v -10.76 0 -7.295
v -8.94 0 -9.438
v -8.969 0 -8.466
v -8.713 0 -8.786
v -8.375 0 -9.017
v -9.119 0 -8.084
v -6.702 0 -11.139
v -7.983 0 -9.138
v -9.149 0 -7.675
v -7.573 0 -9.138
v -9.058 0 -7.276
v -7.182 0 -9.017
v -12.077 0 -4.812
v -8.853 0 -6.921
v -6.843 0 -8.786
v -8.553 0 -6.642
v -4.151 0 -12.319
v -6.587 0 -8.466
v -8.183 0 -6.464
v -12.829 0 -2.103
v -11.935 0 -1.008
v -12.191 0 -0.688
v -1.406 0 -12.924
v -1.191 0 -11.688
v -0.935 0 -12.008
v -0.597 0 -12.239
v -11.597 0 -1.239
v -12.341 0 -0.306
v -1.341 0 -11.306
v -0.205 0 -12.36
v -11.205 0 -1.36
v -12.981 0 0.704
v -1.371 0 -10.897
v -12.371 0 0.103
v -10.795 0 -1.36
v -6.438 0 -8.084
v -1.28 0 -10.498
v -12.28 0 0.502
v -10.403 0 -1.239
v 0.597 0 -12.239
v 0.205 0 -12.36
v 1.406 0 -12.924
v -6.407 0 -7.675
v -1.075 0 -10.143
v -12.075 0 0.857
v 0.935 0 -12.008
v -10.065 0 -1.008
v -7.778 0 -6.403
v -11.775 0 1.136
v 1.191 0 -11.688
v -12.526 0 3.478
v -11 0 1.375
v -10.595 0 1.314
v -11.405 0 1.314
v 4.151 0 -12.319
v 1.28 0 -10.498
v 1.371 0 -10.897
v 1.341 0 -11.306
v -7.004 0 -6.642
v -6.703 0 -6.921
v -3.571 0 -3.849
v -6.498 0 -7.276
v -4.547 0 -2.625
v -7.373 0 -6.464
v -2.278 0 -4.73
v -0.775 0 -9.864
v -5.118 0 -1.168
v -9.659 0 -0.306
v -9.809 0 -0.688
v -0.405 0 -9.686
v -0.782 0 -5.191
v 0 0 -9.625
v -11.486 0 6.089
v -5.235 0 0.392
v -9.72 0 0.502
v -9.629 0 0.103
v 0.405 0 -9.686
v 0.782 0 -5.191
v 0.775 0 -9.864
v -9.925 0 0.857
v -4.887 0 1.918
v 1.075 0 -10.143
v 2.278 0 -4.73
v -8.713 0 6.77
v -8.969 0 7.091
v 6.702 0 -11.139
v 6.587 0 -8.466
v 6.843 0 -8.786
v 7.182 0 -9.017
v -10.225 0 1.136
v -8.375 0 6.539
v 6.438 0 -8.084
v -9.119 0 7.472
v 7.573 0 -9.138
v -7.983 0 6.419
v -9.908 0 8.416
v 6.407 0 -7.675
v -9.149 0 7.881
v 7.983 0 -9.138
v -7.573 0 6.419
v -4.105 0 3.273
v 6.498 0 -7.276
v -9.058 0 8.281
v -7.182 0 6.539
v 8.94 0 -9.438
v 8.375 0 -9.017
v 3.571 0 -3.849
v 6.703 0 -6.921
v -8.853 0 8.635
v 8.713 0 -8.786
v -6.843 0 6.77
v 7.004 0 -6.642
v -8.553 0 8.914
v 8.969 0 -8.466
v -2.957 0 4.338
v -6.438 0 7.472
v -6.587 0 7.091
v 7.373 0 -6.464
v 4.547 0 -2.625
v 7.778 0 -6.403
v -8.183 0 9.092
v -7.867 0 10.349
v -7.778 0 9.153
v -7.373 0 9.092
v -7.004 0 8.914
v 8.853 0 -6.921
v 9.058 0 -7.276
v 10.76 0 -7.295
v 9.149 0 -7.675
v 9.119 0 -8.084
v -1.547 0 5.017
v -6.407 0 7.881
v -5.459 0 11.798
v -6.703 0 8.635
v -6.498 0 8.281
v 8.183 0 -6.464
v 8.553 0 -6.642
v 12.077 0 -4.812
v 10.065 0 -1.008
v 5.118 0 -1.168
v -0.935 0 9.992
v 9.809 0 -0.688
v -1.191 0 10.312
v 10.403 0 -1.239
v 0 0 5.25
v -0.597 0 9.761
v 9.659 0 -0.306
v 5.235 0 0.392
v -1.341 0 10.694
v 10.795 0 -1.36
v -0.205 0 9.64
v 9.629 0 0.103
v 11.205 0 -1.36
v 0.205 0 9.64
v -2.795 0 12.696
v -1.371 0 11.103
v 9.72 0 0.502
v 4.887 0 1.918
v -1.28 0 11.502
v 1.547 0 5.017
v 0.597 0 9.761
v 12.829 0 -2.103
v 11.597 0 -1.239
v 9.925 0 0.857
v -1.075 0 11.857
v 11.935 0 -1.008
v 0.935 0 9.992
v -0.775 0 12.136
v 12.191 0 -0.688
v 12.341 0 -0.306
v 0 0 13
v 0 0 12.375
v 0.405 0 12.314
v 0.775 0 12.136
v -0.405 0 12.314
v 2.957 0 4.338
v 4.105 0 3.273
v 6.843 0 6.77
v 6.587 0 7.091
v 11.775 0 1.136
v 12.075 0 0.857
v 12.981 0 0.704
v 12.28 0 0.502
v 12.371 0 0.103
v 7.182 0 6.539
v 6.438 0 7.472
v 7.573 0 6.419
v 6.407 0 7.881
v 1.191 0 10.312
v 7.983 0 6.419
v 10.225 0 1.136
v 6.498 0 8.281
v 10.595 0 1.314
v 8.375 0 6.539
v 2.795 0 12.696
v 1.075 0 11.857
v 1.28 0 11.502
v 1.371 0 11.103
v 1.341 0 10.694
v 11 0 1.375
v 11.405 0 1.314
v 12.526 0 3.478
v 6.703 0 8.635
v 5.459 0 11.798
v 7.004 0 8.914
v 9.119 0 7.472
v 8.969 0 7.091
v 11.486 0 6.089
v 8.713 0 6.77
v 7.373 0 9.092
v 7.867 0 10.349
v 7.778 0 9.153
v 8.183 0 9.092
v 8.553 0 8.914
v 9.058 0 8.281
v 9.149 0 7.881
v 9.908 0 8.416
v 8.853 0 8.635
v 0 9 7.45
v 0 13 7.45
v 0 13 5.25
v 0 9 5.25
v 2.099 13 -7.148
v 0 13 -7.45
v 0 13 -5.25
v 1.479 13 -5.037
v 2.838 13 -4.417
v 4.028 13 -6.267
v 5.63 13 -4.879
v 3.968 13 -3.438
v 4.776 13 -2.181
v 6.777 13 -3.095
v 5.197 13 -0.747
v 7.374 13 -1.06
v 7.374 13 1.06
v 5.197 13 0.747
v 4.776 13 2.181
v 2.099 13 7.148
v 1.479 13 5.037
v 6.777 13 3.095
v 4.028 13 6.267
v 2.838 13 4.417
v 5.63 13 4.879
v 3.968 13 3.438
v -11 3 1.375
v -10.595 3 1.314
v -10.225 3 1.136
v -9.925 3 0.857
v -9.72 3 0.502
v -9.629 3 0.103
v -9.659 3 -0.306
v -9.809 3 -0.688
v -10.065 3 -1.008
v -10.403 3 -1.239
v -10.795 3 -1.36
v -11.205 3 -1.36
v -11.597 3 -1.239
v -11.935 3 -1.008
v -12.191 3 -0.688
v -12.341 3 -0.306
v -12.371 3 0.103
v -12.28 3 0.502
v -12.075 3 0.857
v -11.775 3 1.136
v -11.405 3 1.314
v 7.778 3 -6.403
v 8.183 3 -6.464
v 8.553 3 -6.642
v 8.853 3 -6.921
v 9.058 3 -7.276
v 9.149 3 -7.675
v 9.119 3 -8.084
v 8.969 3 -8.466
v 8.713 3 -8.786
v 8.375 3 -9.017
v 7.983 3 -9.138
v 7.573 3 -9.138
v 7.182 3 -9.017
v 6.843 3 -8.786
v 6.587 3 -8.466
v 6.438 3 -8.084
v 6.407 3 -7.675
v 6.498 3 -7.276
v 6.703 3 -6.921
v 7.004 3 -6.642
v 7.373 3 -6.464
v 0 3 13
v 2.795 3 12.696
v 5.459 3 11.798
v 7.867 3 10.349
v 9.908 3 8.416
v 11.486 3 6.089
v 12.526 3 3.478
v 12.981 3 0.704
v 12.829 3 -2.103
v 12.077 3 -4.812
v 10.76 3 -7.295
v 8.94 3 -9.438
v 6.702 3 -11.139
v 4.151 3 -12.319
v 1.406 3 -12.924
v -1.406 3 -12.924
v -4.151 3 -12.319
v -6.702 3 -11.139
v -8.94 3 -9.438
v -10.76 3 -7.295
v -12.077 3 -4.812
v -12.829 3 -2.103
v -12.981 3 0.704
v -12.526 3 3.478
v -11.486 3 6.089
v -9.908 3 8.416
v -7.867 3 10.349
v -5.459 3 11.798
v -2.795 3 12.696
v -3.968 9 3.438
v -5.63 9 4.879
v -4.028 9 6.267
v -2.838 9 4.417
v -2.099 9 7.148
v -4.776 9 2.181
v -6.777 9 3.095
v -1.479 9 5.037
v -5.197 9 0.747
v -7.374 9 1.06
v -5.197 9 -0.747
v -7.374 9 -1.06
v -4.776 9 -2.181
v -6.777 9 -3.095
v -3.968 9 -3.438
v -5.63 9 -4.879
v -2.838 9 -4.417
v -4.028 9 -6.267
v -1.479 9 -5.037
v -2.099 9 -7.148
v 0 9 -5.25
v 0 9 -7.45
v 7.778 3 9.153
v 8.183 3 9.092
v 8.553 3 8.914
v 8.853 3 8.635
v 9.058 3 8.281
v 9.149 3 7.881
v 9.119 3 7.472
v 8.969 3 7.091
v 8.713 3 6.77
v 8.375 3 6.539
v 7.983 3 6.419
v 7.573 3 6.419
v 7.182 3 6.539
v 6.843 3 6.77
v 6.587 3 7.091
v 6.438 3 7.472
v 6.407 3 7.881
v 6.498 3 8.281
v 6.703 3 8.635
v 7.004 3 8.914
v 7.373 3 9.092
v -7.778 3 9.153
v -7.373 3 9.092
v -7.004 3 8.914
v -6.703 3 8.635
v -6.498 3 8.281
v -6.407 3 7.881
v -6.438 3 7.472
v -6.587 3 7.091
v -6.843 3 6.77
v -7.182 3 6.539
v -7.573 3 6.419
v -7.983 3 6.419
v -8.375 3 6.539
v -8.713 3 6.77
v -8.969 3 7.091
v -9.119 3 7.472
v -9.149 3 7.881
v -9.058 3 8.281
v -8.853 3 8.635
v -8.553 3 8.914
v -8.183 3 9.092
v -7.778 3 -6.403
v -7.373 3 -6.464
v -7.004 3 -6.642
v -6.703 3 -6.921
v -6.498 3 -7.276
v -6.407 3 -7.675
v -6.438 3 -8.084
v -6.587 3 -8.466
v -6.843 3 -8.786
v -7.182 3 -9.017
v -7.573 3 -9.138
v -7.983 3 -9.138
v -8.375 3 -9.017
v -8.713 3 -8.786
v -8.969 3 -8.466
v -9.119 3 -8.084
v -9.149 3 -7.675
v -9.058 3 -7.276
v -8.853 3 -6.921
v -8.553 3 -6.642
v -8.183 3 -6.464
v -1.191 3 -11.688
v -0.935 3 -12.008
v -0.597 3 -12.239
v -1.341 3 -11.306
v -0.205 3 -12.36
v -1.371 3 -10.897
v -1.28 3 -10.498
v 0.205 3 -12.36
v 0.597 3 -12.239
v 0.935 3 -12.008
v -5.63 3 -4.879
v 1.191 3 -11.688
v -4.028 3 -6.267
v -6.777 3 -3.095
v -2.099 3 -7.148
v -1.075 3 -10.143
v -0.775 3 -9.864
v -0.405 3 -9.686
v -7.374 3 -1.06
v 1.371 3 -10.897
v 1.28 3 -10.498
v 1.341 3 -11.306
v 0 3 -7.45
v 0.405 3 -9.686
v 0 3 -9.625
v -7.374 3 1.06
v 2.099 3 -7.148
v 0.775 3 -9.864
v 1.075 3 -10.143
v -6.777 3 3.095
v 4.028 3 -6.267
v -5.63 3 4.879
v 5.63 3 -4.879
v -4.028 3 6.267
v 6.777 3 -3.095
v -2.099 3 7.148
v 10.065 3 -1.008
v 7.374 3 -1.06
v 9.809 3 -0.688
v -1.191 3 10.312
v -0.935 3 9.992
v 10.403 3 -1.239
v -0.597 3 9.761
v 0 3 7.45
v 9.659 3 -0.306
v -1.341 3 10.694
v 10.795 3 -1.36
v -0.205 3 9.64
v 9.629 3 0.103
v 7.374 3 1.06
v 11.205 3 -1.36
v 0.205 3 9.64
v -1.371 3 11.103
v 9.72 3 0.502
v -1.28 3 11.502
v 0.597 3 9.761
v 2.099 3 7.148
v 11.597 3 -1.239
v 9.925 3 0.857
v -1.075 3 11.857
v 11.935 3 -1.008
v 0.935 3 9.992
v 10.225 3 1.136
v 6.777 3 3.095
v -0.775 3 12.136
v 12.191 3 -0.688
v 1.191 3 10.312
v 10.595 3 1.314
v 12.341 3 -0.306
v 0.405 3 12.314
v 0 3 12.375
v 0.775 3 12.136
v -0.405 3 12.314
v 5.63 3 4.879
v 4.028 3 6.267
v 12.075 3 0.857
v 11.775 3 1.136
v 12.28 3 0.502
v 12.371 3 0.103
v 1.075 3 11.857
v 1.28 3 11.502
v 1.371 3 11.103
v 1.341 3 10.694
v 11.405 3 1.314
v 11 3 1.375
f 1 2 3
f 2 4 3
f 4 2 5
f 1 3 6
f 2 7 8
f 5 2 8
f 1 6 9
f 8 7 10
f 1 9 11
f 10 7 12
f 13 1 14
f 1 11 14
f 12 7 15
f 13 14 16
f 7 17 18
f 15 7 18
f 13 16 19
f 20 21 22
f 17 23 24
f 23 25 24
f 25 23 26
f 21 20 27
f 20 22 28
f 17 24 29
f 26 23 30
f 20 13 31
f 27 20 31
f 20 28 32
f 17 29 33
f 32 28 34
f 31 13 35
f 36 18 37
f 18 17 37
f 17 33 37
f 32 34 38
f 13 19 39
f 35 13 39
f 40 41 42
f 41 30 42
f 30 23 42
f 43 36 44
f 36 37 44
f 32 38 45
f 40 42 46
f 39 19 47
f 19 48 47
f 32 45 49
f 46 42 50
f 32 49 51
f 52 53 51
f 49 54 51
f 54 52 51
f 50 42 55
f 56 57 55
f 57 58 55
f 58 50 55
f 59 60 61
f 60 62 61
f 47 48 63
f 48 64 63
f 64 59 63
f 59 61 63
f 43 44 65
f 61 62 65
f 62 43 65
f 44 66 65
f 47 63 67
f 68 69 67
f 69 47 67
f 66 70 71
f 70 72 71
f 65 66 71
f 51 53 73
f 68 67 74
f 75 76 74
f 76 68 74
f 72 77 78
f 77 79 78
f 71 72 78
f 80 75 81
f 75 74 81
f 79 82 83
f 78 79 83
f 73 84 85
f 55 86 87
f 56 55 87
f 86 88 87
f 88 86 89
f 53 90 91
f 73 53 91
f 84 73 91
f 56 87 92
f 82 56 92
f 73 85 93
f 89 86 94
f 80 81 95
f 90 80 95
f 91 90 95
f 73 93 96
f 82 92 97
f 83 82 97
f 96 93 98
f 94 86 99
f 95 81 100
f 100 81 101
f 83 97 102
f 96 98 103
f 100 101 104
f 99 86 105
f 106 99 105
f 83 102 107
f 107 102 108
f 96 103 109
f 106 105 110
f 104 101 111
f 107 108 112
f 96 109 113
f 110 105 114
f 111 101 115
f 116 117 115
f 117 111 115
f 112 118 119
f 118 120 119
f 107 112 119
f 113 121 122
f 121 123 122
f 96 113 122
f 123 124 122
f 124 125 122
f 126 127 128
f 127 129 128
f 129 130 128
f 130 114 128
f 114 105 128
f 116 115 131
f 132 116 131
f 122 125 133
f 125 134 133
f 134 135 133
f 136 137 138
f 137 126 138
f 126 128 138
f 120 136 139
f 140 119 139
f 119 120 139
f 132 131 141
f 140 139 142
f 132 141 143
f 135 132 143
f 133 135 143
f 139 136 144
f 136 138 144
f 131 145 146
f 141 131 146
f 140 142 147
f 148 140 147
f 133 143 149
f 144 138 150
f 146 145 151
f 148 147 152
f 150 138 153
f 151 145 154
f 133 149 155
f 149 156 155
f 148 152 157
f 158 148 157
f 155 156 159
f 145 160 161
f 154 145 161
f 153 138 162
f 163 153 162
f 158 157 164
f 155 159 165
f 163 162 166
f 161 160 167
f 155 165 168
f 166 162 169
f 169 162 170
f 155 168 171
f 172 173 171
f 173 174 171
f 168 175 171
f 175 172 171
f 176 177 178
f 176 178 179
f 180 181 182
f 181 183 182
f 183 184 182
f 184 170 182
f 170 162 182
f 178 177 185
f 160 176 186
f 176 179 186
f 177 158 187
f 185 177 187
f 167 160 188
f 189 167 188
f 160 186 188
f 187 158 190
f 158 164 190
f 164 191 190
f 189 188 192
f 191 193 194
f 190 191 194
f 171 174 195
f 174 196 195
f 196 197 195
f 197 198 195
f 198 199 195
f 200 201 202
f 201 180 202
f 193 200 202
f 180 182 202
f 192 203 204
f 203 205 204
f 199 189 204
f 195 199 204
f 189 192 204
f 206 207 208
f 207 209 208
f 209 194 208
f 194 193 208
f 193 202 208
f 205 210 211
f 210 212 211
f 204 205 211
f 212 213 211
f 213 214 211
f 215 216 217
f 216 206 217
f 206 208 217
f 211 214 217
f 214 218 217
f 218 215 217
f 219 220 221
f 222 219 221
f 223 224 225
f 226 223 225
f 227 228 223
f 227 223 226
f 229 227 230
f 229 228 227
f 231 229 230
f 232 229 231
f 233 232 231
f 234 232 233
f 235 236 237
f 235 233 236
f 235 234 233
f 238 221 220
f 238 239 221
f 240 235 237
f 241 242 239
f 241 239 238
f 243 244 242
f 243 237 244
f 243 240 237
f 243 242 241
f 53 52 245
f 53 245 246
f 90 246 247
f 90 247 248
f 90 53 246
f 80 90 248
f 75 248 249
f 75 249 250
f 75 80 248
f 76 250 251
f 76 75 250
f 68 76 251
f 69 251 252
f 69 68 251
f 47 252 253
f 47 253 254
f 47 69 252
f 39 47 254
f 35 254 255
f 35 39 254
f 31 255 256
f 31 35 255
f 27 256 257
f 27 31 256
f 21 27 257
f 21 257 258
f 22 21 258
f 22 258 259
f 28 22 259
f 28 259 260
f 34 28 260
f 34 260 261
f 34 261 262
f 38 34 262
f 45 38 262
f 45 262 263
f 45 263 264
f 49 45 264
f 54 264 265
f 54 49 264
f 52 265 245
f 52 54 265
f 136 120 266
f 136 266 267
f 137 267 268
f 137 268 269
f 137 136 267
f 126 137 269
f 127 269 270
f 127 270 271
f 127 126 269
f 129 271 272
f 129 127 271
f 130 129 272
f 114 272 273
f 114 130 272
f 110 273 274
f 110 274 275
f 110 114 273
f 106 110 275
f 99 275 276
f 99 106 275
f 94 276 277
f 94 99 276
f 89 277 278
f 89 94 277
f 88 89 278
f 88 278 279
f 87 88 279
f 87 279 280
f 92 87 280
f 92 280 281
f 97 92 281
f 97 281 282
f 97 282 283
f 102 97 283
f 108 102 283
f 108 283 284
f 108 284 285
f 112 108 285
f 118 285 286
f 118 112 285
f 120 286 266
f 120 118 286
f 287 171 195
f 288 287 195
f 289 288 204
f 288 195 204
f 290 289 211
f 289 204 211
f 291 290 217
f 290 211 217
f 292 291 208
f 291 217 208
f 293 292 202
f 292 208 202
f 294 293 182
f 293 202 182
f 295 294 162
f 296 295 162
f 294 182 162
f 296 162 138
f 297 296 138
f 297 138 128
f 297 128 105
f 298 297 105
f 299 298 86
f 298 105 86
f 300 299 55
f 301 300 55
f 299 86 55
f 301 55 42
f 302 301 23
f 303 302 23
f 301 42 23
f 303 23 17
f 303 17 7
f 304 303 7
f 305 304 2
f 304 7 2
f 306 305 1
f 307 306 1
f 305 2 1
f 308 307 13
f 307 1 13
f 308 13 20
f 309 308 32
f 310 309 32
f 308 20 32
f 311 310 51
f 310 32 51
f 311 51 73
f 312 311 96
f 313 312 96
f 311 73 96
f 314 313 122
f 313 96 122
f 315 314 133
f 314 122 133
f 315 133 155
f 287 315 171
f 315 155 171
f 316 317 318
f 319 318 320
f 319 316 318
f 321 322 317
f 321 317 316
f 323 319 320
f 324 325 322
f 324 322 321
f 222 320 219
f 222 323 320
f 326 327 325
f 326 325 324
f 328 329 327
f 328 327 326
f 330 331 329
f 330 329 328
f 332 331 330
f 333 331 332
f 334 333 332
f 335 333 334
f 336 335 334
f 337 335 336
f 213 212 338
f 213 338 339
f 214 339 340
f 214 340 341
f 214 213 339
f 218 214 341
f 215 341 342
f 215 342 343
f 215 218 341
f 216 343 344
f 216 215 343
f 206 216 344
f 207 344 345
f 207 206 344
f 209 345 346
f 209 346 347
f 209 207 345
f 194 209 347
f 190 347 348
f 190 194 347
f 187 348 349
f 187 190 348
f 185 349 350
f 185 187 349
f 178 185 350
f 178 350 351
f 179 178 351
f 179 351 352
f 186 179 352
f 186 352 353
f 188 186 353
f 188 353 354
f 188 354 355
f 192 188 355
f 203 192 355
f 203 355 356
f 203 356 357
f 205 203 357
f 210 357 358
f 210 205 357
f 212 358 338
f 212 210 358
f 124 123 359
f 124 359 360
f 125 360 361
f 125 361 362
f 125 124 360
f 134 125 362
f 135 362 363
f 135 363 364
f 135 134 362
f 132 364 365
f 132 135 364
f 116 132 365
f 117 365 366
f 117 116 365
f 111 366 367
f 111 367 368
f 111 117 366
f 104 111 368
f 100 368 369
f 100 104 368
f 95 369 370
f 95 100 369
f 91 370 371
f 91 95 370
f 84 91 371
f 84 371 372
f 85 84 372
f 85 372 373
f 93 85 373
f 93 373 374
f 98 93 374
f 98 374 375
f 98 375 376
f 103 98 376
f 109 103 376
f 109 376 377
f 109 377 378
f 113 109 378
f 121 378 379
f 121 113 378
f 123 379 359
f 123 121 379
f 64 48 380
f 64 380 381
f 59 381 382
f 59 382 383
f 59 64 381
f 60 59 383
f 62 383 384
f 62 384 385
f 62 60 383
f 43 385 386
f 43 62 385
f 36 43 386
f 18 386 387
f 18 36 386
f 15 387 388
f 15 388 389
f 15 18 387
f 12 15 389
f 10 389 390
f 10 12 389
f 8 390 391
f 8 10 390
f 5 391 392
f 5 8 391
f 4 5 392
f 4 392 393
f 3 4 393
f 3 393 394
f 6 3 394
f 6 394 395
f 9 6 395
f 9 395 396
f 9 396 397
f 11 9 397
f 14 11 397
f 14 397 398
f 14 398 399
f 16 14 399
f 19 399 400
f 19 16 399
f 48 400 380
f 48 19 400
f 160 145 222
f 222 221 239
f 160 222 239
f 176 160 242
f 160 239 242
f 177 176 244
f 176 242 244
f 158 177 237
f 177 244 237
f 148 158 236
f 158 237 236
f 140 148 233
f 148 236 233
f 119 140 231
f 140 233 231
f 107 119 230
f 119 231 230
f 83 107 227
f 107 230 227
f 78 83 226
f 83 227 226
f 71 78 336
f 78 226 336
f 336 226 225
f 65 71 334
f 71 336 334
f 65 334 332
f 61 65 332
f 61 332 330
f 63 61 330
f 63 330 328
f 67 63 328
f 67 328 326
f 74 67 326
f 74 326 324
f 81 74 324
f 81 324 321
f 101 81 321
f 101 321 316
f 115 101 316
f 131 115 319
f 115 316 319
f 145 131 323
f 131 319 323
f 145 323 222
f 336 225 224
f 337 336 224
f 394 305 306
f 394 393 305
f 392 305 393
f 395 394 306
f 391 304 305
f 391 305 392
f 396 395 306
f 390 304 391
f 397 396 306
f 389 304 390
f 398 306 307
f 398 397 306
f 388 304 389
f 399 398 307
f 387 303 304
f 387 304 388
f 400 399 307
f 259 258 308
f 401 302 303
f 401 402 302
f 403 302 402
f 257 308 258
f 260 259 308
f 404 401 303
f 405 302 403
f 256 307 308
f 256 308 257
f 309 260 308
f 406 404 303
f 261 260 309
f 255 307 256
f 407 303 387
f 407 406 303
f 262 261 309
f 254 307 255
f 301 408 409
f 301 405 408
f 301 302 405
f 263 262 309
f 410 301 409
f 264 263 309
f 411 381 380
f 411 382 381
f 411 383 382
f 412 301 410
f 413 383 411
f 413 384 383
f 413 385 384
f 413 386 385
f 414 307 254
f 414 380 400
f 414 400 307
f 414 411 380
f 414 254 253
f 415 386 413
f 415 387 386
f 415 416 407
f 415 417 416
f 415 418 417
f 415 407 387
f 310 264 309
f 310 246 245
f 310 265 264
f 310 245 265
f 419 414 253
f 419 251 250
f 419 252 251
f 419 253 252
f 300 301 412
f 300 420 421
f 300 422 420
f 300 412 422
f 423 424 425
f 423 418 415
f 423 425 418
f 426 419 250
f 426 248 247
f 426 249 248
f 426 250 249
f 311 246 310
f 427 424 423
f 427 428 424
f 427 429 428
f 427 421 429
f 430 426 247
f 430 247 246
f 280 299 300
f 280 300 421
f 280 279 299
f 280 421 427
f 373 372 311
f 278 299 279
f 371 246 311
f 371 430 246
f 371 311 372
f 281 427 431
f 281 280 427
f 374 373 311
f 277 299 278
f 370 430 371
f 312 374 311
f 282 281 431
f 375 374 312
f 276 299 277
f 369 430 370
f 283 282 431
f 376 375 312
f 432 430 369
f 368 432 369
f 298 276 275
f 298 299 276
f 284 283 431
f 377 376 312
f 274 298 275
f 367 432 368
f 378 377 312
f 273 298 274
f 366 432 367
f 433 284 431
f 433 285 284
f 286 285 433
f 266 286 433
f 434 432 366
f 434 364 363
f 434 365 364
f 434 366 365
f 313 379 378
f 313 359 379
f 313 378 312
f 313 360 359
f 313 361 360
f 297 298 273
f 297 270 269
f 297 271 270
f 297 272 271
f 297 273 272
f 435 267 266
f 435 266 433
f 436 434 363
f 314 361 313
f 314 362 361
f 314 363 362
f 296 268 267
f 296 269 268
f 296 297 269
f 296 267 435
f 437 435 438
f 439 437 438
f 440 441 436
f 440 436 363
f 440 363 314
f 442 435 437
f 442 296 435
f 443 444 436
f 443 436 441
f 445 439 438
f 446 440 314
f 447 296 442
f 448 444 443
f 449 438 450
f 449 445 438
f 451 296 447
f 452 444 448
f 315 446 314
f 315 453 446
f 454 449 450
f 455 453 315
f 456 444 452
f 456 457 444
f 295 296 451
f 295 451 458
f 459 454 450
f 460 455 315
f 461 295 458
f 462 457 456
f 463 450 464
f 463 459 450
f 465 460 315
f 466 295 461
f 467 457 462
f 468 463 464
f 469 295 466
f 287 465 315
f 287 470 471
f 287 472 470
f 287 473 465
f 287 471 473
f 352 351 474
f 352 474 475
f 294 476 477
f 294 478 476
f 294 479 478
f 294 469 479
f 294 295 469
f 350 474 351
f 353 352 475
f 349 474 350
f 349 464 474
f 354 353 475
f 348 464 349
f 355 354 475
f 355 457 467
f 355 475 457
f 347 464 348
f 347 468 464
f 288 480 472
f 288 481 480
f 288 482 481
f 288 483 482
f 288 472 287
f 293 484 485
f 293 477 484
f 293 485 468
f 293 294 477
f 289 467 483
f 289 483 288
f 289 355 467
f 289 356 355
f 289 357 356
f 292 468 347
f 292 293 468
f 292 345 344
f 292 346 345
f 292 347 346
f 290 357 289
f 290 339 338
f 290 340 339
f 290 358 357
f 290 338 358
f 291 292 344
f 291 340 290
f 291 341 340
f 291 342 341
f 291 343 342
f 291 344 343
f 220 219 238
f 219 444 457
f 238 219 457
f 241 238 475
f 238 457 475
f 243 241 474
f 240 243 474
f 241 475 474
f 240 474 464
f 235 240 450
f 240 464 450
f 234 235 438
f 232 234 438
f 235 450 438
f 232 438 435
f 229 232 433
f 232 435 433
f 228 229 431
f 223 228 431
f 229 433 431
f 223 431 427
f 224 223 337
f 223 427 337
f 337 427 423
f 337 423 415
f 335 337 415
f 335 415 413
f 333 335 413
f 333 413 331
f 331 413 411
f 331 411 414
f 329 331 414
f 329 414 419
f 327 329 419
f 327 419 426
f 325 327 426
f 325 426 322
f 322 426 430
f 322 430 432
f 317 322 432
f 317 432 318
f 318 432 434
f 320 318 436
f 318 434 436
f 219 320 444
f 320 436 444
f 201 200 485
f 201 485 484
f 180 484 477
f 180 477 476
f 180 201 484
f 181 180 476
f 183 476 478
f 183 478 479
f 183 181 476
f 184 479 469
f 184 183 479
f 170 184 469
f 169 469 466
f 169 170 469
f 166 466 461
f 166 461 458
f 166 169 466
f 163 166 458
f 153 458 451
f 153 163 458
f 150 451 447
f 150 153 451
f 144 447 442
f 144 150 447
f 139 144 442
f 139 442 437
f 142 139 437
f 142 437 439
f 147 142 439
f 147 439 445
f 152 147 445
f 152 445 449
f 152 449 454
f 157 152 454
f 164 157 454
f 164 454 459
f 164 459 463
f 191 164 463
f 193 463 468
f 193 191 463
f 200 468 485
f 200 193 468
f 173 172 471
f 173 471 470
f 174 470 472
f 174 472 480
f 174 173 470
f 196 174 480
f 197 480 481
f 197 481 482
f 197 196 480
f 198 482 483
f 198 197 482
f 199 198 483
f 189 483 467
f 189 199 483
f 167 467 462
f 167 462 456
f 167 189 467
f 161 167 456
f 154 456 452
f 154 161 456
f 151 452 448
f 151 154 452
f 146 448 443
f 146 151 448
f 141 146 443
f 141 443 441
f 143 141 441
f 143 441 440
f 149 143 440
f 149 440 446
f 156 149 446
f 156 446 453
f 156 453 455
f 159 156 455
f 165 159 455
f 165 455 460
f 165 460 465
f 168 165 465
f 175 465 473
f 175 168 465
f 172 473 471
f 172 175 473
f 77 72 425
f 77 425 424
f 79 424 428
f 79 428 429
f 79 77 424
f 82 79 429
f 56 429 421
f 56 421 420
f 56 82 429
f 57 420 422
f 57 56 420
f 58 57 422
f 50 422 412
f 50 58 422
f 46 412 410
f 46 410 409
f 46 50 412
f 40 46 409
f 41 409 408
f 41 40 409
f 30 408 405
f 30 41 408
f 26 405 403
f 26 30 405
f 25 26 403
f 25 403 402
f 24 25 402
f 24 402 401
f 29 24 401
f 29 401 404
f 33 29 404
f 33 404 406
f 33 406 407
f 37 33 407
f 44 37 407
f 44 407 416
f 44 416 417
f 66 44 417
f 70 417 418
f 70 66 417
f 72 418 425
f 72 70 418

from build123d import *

# Parameters (mm, degrees)
SKETCH1_R           = 13
SKETCH1_R_2         = 1.375
SKETCH1_R_3         = 5
BOSS_EXTRUDE1_DEPTH = 3
SKETCH2_R           = 7.5
SKETCH2_R_2         = 5
BOSS_EXTRUDE2_DEPTH = 10
SKETCH3_R           = 5.25
CUT_EXTRUDE1_DEPTH  = 18
CUT_EXTRUDE2_DEPTH  = 4
CUT_EXTRUDE3_START  = -10
SKETCH5_R           = 7.5
SKETCH5_R_2         = 7.45
CUT_EXTRUDE3_DEPTH  = 10


with BuildPart() as part:
    # Sketch1 → Boss-Extrude1 (new body)
    with BuildSketch(Plane(origin=(0, 0, 0), x_dir=(1, 0, 0), z_dir=(0, 1, 0))):
        with Locations(Location((0, 0, 0), (0, 0, 270))):
            Circle(SKETCH1_R)
        with Locations(Location((0, 11, 0), (0, 0, 270))):
            Circle(SKETCH1_R_2, mode=Mode.SUBTRACT)
        with Locations(Location((7.778174593, 7.778174593, 0), (0, 0, 270))):
            Circle(SKETCH1_R_2, mode=Mode.SUBTRACT)
        with Locations(Location((11, 0, 0), (0, 0, 270))):
            Circle(SKETCH1_R_2, mode=Mode.SUBTRACT)
        with Locations(Location((7.778174593, -7.778174593, 0), (0, 0, 270))):
            Circle(SKETCH1_R_2, mode=Mode.SUBTRACT)
        with Locations(Location((0, -11, 0), (0, 0, 270))):
            Circle(SKETCH1_R_2, mode=Mode.SUBTRACT)
        with Locations(Location((-7.778174593, -7.778174593, 0), (0, 0, 270))):
            Circle(SKETCH1_R_2, mode=Mode.SUBTRACT)
        with Locations(Location((-11, 0, 0), (0, 0, 270))):
            Circle(SKETCH1_R_2, mode=Mode.SUBTRACT)
        with Locations(Location((-7.778174593, 7.778174593, 0), (0, 0, 270))):
            Circle(SKETCH1_R_2, mode=Mode.SUBTRACT)
        with Locations(Location((0, 0, 0), (0, 0, 270))):
            Circle(SKETCH1_R_3, mode=Mode.SUBTRACT)
    extrude(amount=BOSS_EXTRUDE1_DEPTH)

    # Sketch2 → Boss-Extrude2 (add)
    with BuildSketch(Plane(origin=(0, 3, 0), x_dir=(1, 0, 0), z_dir=(0, 1, 0))):
        with Locations(Location((0, 0, 0), (0, 0, 270))):
            Circle(SKETCH2_R)
        with Locations(Location((0, 0, 0), (0, 0, 270))):
            Circle(SKETCH2_R_2, mode=Mode.SUBTRACT)
    extrude(amount=BOSS_EXTRUDE2_DEPTH)

    # Sketch3 → Cut-Extrude1 (cut)
    with BuildSketch(Plane(origin=(0, 13, 0), x_dir=(1, 0, 0), z_dir=(0, 1, 0))):
        with Locations(Location((0, 0, 0), (0, 0, 270))):
            Circle(SKETCH3_R)
    extrude(amount=-CUT_EXTRUDE1_DEPTH, mode=Mode.SUBTRACT)

    # Sketch4 → Cut-Extrude2 (cut)
    with BuildSketch(Plane(origin=(0, 13, 0), x_dir=(1, 0, 0), z_dir=(0, 1, 0))):
        with BuildLine():
            Line((0, 5.25), (0, 7.5))
            ThreePointArc((0, 7.5), (-7.5, 0), (0, -7.5))
            Line((0, -7.5), (0, -5.25))
            ThreePointArc((0, -5.25), (-5.25, 0), (0, 5.25))
        make_face()
    extrude(amount=-CUT_EXTRUDE2_DEPTH, mode=Mode.SUBTRACT)

    # Sketch5 → Cut-Extrude3 (cut)
    with BuildSketch(Plane(origin=(0, 13, 0), x_dir=(1, 0, 0), z_dir=(0, 1, 0)).offset(CUT_EXTRUDE3_START)):
        Circle(SKETCH5_R)
        with Locations(Location((0, 0, 0), (0, 0, 270))):
            Circle(SKETCH5_R_2, mode=Mode.SUBTRACT)
    extrude(amount=CUT_EXTRUDE3_DEPTH, mode=Mode.SUBTRACT)


solid = part.part
